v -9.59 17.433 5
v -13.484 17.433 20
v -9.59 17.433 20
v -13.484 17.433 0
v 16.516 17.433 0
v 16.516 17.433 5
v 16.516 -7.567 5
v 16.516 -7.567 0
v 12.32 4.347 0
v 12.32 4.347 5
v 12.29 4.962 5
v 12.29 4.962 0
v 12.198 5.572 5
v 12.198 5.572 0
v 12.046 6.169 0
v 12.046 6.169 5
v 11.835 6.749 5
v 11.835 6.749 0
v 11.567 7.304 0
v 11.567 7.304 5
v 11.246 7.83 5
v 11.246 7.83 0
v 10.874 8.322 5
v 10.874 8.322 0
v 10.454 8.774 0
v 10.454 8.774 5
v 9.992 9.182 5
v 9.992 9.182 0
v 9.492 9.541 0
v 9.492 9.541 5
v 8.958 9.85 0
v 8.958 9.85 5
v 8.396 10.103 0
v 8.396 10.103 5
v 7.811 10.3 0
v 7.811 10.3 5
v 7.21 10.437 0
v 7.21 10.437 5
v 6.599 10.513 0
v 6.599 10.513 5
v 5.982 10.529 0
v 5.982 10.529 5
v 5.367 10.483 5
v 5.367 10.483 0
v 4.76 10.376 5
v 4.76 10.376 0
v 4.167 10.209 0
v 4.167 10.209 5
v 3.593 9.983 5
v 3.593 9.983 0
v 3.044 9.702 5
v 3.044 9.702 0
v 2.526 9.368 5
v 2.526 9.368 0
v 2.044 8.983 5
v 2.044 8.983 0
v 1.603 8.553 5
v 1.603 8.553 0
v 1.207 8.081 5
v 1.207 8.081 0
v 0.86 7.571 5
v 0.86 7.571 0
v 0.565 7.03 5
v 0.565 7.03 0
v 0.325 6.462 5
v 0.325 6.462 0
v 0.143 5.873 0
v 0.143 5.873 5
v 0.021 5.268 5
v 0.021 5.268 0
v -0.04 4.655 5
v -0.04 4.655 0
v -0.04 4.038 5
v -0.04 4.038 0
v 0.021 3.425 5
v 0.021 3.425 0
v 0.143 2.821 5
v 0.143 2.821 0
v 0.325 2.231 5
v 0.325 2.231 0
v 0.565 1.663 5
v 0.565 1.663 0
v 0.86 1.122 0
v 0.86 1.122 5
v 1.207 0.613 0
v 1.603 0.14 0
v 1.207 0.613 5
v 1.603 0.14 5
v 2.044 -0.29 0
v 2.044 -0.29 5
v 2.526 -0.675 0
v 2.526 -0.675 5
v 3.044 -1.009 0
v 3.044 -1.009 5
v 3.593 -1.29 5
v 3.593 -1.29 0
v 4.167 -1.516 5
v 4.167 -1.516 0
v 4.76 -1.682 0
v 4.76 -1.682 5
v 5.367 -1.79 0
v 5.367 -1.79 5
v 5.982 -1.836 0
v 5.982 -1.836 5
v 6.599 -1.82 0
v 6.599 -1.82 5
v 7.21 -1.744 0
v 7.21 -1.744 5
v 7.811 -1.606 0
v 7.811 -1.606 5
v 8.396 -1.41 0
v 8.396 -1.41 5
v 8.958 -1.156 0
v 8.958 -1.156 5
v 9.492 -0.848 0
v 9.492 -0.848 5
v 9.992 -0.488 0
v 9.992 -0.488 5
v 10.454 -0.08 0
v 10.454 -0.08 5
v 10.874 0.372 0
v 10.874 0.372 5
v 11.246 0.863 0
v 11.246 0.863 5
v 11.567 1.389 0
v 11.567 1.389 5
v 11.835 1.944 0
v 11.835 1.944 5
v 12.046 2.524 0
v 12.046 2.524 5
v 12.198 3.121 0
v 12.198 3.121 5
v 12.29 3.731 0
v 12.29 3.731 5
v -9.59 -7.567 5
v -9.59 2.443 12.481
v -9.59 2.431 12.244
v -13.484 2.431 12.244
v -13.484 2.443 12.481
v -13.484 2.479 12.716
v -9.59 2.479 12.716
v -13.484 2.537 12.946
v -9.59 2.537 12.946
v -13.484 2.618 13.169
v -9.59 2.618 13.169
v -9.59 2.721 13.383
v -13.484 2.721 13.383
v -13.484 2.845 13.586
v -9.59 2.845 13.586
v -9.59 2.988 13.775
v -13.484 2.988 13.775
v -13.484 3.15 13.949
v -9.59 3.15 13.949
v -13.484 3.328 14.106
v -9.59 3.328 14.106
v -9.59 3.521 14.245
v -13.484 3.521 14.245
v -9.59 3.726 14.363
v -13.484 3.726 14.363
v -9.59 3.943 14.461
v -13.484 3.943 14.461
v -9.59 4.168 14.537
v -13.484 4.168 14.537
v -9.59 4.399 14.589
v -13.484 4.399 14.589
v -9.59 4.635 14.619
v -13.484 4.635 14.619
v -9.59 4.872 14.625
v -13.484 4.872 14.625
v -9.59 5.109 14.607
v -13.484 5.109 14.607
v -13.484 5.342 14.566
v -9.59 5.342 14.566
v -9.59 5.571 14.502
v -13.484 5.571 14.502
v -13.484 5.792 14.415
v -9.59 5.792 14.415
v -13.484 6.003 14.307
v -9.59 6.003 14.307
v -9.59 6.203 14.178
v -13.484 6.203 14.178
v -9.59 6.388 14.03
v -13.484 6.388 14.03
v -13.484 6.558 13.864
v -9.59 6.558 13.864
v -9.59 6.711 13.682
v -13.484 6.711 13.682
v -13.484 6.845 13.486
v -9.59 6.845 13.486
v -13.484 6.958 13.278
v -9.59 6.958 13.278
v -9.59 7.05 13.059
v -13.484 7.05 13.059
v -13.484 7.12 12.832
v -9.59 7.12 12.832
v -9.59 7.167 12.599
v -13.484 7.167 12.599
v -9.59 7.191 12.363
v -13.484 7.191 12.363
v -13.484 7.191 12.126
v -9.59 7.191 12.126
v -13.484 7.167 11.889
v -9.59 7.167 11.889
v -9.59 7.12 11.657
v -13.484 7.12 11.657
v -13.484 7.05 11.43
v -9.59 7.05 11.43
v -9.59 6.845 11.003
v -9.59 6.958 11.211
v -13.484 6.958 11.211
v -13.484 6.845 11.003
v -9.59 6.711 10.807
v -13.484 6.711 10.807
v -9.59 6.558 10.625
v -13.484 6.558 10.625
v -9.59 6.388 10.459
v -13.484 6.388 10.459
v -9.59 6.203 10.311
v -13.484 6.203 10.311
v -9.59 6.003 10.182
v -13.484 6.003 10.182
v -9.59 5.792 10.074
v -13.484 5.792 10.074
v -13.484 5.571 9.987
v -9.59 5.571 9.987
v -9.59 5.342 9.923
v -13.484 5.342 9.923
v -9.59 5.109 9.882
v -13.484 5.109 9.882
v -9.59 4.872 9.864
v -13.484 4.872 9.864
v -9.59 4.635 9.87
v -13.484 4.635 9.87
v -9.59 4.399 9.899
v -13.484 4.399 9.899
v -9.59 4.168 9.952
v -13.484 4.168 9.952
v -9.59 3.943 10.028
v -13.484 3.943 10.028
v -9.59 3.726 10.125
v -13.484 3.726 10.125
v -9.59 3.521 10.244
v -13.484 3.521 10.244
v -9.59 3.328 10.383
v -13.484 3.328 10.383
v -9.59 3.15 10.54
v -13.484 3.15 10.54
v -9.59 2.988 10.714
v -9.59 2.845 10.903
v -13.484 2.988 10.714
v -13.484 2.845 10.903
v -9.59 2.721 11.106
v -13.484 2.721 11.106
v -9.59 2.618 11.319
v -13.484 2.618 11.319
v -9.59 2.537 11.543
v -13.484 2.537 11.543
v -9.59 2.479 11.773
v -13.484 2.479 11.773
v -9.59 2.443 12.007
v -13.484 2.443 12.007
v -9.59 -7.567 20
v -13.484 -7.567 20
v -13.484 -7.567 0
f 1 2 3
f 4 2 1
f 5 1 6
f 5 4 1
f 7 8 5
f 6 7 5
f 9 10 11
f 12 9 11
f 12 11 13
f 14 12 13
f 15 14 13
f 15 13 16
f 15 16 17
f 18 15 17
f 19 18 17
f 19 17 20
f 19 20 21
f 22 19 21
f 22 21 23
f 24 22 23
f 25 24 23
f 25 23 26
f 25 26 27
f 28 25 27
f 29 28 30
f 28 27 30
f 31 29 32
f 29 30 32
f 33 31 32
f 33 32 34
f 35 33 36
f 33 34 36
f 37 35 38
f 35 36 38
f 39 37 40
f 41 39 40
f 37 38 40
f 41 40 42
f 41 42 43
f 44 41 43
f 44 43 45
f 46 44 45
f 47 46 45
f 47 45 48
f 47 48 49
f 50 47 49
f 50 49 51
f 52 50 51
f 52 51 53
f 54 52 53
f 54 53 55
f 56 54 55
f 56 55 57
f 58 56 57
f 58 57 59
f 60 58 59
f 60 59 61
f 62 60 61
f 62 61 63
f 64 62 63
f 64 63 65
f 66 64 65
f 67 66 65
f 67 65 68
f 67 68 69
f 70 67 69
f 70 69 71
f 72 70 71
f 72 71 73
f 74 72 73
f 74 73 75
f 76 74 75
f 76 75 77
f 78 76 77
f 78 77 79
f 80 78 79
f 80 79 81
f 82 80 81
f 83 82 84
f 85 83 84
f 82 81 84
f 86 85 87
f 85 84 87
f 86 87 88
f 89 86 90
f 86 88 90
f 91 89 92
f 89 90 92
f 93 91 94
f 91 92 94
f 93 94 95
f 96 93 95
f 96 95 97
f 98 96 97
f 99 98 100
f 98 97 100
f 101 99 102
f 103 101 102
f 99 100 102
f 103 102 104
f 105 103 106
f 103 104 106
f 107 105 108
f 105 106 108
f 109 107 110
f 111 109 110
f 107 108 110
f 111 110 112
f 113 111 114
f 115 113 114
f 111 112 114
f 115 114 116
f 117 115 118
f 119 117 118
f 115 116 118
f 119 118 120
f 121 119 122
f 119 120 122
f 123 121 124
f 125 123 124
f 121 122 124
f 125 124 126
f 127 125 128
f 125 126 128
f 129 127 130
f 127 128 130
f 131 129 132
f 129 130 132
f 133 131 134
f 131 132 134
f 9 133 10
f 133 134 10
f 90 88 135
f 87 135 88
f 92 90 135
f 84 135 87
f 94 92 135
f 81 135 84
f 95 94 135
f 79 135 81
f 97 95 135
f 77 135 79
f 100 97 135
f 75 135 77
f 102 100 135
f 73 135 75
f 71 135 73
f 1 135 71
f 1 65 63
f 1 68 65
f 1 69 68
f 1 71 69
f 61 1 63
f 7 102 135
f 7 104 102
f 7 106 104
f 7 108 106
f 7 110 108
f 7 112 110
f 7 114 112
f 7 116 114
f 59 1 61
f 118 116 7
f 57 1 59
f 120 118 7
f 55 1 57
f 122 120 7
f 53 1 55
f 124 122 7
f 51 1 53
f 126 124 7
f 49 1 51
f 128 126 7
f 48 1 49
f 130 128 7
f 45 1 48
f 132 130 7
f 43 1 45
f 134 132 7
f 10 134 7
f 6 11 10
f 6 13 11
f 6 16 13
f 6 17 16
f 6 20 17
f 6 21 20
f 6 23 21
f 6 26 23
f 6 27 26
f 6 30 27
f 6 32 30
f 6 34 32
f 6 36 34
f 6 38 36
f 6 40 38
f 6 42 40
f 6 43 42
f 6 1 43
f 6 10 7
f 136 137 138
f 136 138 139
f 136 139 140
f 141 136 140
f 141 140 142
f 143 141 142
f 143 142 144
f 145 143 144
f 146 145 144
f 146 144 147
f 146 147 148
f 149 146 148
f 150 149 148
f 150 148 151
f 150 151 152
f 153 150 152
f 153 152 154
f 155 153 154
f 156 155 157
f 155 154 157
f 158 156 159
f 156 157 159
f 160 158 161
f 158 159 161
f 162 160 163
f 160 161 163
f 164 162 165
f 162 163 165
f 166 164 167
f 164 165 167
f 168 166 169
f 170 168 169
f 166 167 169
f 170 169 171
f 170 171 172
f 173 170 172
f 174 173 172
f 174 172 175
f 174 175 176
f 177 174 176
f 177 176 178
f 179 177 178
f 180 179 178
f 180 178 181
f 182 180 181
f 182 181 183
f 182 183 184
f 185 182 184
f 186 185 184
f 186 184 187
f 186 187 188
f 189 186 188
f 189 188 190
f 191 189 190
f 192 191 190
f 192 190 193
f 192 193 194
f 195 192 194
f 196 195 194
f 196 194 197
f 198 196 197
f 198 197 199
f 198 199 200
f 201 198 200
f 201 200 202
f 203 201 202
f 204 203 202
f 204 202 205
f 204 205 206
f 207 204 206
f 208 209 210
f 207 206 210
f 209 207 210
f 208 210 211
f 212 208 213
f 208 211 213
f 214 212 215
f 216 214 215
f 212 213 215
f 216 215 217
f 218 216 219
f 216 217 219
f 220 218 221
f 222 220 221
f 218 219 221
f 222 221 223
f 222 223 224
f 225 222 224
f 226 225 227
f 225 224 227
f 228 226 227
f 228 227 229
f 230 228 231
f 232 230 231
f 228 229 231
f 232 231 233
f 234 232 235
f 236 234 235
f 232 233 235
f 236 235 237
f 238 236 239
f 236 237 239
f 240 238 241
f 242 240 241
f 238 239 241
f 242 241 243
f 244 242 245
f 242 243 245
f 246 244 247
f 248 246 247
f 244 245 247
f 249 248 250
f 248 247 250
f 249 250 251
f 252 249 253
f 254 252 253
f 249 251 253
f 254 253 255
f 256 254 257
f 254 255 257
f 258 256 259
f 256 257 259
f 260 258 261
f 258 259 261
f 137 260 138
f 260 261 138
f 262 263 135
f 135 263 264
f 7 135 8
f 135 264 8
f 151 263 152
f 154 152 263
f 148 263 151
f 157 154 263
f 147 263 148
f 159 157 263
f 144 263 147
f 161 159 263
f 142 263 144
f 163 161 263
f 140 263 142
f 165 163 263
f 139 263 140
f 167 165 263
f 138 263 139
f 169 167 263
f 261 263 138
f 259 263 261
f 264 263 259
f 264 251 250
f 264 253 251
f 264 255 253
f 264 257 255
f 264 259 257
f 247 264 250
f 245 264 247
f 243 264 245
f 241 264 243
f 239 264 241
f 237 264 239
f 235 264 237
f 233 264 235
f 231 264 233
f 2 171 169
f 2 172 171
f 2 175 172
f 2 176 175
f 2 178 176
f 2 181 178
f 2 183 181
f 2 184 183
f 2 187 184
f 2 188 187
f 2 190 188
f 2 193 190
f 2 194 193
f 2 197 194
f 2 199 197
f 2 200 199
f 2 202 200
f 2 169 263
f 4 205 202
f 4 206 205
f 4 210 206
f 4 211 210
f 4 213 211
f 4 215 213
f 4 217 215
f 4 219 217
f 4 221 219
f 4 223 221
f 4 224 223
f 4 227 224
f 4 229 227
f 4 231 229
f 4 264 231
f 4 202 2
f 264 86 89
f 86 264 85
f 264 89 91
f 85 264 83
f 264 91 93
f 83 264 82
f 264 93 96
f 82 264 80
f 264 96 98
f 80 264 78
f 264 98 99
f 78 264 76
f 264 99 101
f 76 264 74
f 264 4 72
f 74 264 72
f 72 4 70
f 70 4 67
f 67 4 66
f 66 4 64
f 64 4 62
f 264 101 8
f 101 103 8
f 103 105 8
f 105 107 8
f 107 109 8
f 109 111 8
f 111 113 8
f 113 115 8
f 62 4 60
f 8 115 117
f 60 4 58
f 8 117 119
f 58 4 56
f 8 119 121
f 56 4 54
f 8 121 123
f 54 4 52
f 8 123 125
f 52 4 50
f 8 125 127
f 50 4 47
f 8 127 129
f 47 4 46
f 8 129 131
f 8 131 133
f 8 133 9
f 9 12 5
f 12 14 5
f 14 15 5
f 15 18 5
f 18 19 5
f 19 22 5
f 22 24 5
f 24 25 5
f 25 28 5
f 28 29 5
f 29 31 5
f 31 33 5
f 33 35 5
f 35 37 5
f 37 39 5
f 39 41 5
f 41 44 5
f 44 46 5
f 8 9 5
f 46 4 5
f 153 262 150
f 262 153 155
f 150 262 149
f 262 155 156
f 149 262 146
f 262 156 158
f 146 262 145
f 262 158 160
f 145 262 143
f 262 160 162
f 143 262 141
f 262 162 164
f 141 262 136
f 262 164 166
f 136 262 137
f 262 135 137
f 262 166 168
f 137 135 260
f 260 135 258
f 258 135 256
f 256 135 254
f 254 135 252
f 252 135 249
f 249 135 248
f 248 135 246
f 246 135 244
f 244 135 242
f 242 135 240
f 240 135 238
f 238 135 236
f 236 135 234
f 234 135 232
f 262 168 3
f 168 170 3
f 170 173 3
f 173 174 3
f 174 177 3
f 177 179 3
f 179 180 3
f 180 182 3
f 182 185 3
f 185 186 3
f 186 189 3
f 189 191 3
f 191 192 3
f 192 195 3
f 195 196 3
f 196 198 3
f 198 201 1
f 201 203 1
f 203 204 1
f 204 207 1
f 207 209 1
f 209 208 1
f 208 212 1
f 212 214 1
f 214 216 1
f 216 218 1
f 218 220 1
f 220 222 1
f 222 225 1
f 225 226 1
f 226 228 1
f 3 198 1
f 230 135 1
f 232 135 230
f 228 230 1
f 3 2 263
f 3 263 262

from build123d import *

# Parameters (mm, degrees)
F0_W     = 3.893223
F0_H     = 25
F2_DEPTH = 20
F0_W_2   = 26.106777
F3_DEPTH = 5
F4_R     = 2.38125
F5_DEPTH = 25
F6_R     = 6.184118
F7_DEPTH = 6


with BuildPart() as f2:
    # F0 (on Top) → F2 (new body)
    with BuildSketch(Plane.XY):
        with Locations((-11.537091, 4.933417)):
            Rectangle(F0_W, F0_H)
    extrude(amount=F2_DEPTH)

    # F0 (on Top) → F3 (join)
    with BuildSketch(Plane.XY):
        with Locations((-11.537091, 4.933417)):
            Rectangle(F0_W, F0_H)
        with Locations((3.462908, 4.933417)):
            Rectangle(F0_W_2, F0_H)
    extrude(amount=F3_DEPTH)

    # F4 (on face) → F5 (cut)
    with BuildSketch(Plane(origin=(-13.483703, 0, 0), x_dir=(0, -1, 0), z_dir=(-1, 0, 0))):
        with Locations((-4.812612, 12.244398)):
            Circle(F4_R)
    extrude(amount=-F5_DEPTH, mode=Mode.SUBTRACT)

    # F6 (on face) → F7 (cut)
    with BuildSketch(Plane.XY.offset(5)):
        with Locations((6.136364, 4.346591)):
            Circle(F6_R)
    extrude(amount=-F7_DEPTH, mode=Mode.SUBTRACT)


solid = f2.part
